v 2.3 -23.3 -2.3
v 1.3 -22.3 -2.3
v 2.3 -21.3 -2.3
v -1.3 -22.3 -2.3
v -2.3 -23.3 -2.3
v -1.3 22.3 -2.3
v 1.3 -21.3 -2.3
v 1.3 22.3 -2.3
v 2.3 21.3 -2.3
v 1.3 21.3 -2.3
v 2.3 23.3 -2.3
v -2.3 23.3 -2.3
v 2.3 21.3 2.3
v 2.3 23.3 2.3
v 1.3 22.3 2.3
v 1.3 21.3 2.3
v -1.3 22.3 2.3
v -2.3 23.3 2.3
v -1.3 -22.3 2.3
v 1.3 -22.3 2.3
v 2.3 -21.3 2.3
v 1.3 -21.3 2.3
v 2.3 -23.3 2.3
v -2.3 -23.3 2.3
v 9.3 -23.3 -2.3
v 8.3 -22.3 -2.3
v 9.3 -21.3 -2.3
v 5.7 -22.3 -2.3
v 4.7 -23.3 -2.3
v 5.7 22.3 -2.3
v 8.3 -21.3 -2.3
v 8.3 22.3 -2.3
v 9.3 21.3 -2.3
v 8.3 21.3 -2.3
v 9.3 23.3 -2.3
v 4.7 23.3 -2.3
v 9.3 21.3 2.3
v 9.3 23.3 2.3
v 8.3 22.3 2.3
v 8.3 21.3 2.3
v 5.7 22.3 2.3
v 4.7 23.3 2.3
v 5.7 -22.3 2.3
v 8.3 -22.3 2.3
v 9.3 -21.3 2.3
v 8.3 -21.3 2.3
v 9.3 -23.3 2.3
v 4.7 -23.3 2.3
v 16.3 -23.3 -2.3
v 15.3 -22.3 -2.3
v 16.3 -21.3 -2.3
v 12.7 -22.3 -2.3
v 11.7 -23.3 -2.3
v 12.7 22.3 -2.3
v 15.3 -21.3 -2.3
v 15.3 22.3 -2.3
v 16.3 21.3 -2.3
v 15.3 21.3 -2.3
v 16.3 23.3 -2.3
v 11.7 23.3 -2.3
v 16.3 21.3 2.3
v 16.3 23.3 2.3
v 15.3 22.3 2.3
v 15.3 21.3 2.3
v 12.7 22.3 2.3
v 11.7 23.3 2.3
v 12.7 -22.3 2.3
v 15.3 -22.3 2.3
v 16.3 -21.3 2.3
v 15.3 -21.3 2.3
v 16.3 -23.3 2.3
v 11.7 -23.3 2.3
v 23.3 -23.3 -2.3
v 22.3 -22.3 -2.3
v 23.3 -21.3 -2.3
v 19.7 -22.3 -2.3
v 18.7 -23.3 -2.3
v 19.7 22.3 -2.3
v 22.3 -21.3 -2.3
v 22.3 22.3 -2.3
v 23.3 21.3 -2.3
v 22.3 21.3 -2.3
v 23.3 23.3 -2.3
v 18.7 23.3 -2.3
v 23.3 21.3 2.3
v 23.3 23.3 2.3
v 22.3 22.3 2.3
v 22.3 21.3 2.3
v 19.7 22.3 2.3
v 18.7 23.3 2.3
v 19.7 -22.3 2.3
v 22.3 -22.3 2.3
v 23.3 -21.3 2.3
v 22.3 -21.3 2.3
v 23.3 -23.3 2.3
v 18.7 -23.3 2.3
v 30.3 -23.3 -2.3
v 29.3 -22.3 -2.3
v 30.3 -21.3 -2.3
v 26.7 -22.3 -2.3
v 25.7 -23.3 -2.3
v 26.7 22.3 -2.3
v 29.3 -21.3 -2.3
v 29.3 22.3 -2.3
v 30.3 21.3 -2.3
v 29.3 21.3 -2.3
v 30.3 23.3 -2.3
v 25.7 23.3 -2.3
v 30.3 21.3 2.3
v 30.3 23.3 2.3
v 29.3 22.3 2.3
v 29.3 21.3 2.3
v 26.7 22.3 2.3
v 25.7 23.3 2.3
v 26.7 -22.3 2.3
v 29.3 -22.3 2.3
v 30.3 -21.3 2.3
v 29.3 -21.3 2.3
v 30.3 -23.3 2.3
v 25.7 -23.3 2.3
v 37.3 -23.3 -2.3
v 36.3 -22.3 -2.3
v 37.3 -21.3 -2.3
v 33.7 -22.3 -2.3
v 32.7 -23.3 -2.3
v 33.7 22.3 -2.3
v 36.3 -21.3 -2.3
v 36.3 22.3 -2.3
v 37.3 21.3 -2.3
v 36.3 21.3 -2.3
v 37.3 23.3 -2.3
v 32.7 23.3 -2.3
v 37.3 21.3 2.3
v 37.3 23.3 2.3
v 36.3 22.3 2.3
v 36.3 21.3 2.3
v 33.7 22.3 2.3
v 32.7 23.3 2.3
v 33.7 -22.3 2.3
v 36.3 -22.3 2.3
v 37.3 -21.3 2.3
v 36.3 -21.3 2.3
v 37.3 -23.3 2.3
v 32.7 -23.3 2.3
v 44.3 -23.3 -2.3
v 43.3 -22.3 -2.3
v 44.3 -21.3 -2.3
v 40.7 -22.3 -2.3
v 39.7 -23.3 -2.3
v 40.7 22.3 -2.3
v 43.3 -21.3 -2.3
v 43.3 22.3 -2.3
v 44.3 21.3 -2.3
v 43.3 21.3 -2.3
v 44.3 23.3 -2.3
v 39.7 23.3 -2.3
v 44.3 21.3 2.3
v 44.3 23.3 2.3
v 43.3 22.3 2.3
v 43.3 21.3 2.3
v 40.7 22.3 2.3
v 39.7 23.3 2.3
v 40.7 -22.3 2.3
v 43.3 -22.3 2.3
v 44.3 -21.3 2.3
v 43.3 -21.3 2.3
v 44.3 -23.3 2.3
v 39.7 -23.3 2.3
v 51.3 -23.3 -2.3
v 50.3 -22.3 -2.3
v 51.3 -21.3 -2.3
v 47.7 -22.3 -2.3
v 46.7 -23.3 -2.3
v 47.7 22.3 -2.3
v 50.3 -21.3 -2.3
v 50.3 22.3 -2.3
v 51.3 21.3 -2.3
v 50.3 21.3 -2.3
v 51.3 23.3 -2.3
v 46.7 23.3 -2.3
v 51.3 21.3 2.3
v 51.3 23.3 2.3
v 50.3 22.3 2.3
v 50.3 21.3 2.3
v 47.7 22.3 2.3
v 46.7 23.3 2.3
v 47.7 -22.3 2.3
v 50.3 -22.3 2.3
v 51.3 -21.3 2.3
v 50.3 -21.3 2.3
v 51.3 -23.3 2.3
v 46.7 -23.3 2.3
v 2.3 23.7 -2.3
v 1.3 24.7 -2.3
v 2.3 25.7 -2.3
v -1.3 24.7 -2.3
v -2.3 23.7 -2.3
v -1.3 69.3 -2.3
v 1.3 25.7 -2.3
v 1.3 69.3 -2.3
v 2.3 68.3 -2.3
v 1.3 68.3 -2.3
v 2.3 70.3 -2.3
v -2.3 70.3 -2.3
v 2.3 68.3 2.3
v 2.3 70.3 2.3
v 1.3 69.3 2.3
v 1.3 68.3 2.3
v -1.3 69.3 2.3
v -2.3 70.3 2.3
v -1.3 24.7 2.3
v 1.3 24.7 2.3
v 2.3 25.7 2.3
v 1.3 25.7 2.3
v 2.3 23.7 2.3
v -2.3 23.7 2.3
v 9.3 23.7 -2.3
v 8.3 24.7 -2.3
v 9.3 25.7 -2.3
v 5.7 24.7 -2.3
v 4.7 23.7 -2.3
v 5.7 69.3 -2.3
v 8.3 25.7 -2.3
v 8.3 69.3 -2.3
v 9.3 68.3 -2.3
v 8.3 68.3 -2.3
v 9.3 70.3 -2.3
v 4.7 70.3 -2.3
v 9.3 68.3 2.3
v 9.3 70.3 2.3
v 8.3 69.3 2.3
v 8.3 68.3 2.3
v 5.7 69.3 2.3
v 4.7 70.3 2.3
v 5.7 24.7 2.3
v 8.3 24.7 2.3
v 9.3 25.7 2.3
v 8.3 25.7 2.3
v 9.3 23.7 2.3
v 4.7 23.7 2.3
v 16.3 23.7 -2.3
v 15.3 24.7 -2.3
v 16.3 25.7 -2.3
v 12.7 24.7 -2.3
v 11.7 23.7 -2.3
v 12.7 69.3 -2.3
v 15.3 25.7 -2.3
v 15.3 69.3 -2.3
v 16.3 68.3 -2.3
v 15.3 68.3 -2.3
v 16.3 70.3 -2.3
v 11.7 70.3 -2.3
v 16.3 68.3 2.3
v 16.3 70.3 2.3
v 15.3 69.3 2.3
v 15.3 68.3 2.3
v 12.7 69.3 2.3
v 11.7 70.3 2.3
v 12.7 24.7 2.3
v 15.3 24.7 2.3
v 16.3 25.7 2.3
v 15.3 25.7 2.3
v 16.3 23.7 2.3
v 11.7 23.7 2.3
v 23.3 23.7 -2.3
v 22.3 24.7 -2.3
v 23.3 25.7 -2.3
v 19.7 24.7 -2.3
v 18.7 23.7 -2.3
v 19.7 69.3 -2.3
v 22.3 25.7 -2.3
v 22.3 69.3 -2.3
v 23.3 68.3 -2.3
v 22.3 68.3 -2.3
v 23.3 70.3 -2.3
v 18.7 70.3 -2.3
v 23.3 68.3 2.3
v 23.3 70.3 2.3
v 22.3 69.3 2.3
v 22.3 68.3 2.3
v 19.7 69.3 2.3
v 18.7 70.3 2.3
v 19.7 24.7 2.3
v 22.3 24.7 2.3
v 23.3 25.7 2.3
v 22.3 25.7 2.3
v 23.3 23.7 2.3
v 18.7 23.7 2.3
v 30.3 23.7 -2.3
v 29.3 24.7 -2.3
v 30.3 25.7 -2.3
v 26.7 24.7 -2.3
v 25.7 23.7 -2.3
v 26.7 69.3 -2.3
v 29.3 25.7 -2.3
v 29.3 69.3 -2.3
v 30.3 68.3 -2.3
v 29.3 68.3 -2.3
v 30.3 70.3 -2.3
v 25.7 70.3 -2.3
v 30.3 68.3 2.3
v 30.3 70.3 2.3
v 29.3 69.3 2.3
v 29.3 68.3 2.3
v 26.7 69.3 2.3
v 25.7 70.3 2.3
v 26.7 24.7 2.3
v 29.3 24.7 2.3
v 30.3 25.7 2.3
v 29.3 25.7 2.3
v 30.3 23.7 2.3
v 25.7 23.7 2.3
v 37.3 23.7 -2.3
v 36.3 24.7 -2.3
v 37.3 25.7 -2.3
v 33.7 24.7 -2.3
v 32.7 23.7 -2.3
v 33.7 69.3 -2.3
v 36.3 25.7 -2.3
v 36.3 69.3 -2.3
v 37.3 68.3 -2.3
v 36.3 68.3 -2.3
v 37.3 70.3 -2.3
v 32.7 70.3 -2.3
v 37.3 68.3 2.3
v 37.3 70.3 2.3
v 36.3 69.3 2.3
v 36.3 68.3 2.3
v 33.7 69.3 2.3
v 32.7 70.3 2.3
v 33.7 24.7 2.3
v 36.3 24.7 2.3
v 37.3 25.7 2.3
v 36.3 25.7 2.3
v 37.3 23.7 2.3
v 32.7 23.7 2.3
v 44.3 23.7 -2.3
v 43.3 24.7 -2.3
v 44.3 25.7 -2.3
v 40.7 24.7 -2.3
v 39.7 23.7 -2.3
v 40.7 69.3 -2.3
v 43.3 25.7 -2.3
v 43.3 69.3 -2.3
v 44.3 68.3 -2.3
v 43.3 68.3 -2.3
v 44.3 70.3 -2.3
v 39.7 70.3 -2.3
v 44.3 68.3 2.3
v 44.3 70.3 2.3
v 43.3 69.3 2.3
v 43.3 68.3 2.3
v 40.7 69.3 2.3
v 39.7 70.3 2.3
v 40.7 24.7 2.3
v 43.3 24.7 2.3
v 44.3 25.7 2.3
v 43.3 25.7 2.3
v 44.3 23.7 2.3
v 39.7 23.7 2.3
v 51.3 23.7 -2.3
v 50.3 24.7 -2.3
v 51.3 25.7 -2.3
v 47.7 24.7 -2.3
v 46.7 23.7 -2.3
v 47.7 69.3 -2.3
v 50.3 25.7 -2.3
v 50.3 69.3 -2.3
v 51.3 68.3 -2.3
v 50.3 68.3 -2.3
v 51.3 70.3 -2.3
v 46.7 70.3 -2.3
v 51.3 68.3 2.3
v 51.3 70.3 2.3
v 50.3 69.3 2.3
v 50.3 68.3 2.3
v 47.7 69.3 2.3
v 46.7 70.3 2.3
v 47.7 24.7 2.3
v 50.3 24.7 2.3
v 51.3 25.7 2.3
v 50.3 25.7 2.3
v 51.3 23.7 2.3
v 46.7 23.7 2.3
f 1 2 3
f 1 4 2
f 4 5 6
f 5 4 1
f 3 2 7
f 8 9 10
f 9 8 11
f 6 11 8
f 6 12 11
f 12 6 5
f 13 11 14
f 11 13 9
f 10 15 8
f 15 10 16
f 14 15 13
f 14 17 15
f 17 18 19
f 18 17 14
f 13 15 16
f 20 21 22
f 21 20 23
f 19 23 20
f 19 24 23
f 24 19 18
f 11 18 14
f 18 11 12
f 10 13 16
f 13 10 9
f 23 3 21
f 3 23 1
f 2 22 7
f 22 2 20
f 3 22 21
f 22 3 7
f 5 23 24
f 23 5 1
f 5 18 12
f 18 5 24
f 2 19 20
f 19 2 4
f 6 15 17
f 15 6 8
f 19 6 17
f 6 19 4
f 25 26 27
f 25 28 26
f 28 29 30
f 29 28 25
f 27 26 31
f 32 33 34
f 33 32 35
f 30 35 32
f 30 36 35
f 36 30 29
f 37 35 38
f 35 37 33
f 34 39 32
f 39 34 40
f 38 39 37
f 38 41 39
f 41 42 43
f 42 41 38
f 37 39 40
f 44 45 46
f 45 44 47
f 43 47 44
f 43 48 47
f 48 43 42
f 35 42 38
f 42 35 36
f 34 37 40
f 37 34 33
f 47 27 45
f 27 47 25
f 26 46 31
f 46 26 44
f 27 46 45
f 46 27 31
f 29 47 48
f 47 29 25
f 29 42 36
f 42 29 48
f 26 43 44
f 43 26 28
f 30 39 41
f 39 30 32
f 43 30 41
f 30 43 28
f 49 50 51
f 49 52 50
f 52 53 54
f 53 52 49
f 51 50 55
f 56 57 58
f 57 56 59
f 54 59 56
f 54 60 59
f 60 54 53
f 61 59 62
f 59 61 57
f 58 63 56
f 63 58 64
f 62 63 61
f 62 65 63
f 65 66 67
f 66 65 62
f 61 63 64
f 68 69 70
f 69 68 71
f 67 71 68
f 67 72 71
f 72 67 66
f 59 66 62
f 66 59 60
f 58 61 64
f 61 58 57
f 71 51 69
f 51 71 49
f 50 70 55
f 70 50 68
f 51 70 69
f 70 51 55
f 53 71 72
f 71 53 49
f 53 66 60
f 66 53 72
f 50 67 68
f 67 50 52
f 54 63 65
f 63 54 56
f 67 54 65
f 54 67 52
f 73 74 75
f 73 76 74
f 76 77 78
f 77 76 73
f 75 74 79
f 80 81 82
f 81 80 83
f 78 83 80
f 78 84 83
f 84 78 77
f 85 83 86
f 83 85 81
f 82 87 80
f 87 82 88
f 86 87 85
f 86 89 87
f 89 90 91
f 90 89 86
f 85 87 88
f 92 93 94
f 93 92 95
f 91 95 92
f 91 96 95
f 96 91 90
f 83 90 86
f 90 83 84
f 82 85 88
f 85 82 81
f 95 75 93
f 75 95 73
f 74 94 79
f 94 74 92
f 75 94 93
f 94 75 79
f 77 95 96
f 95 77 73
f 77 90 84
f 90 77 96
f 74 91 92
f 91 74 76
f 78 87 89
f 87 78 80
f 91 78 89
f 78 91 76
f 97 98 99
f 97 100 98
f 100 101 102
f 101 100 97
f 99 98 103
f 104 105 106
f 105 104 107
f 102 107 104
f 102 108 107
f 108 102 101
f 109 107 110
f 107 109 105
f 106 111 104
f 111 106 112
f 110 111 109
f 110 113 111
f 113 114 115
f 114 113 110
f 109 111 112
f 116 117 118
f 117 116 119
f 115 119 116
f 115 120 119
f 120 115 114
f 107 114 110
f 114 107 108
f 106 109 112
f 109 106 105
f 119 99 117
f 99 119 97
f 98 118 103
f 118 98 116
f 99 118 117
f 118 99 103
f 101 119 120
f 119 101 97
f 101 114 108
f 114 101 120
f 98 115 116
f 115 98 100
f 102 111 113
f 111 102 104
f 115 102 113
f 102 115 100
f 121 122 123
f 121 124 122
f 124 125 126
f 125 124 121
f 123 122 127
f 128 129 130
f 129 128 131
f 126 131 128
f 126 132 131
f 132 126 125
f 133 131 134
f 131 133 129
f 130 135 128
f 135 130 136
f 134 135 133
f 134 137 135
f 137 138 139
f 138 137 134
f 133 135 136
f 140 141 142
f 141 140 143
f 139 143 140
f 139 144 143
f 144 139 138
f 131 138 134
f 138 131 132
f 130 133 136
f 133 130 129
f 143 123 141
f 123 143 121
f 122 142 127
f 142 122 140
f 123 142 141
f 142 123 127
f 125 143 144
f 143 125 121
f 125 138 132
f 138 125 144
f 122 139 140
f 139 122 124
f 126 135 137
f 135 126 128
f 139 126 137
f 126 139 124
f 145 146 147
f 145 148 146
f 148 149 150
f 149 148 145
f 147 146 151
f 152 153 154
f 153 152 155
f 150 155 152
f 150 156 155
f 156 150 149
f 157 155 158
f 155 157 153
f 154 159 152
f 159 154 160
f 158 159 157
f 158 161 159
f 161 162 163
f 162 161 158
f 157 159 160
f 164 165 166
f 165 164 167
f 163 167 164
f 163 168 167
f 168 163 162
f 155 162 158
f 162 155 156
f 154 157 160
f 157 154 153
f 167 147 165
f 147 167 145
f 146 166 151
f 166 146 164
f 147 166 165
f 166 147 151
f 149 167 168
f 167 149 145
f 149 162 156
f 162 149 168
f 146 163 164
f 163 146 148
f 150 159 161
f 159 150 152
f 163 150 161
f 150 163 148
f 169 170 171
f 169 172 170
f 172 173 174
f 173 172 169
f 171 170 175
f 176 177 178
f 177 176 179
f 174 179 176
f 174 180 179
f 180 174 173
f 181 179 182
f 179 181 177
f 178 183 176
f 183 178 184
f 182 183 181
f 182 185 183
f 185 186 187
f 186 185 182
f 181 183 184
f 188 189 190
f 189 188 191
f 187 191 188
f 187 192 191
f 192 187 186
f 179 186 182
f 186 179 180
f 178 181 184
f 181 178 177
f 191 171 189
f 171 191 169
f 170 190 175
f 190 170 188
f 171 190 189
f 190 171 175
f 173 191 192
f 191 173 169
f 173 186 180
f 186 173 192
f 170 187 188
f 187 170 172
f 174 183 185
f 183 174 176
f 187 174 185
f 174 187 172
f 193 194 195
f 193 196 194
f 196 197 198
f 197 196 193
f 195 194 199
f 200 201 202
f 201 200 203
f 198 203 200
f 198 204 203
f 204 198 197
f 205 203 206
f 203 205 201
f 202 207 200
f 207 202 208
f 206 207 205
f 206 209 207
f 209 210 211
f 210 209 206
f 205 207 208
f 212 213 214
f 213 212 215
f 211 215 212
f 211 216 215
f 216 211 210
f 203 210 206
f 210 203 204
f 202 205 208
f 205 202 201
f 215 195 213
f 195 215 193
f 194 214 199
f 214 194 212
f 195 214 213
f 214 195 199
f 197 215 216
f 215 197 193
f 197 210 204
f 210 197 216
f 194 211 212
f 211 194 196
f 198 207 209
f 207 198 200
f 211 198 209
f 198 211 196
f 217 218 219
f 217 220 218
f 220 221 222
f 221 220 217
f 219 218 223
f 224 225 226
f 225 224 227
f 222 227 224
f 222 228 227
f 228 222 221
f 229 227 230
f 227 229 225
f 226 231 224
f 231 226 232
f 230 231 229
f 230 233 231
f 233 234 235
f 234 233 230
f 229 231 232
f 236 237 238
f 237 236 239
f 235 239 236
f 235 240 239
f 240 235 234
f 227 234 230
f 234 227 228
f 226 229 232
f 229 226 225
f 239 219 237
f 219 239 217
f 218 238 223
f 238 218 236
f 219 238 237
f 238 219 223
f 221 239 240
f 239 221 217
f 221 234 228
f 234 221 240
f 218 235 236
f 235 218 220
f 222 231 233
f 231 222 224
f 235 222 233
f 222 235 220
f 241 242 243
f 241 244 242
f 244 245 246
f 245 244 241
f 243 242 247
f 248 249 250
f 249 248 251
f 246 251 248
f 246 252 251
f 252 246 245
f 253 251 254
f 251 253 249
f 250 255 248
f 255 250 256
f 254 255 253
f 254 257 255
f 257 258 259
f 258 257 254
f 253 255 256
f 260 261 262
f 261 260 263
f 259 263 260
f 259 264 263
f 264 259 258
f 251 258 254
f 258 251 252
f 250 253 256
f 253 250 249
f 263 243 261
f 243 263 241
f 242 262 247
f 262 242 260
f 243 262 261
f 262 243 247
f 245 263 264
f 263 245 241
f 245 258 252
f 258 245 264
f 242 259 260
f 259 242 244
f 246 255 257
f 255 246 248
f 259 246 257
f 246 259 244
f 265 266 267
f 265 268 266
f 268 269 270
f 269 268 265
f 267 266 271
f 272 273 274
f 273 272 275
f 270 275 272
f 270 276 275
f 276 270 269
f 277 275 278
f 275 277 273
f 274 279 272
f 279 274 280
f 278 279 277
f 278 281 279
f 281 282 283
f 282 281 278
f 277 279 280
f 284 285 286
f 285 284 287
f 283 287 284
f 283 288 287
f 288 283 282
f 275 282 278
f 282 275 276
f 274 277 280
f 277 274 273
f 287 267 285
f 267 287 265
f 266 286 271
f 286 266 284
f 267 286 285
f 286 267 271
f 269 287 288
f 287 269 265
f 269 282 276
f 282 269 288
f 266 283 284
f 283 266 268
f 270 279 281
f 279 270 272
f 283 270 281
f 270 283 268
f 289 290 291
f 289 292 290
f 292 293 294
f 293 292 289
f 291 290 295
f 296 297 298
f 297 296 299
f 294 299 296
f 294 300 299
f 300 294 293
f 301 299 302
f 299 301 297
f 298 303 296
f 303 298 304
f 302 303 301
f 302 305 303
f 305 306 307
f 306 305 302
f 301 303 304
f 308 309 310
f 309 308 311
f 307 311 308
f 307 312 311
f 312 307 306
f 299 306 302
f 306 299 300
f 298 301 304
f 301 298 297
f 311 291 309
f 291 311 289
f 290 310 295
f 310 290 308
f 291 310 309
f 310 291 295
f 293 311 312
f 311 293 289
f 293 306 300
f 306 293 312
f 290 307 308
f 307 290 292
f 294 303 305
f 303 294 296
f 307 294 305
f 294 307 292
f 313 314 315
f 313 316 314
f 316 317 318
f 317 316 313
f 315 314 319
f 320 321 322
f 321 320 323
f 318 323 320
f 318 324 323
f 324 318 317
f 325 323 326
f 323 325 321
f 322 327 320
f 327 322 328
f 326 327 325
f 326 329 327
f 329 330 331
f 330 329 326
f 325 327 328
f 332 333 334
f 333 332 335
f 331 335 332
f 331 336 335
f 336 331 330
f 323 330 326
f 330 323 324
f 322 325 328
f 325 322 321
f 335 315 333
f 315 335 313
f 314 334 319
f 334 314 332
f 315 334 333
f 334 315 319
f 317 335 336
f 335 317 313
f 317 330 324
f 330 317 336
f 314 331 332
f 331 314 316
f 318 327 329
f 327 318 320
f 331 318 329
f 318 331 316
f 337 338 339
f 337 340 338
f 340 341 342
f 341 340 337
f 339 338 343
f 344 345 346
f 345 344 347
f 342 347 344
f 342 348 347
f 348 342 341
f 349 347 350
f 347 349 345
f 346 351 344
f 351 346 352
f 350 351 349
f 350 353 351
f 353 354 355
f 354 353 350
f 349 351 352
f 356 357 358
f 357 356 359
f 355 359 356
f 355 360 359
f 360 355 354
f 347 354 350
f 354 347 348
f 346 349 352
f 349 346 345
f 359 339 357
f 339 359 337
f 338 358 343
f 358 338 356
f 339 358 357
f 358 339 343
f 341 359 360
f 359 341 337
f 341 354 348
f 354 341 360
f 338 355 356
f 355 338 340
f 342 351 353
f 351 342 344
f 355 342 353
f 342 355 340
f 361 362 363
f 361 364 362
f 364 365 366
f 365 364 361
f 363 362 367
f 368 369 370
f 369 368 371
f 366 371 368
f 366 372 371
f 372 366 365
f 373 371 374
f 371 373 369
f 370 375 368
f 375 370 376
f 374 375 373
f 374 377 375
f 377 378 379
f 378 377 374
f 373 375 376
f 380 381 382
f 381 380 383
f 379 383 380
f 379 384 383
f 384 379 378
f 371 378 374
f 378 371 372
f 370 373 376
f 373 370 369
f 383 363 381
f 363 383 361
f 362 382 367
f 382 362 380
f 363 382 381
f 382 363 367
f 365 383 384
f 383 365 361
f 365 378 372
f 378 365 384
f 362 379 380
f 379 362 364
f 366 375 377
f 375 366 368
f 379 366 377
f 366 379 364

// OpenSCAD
for(i=[0:1]) {
    for(j=[0:7]) {
        translate([j*7,i*47,0])
        complete();
    }
}

module complete() {
    rotate([0,90,0])
    union() {
        translate([0,+46.6/2-1,1.8])
        cube([4.6,2,1], center = true);
        translate([0,-46.6/2+1,1.8])
        cube([4.6,2,1], center = true);
        
        translate([0,-46.6/2+0.5,0])
        cube([4.6,1,4.6], center = true);
        translate([0,46.6/2-0.5,0])
        cube([4.6,1,4.6], center = true);
        
        translate([0,0,-1.8])
        cube([4.6,46.6,1], center = true);
    }
}
